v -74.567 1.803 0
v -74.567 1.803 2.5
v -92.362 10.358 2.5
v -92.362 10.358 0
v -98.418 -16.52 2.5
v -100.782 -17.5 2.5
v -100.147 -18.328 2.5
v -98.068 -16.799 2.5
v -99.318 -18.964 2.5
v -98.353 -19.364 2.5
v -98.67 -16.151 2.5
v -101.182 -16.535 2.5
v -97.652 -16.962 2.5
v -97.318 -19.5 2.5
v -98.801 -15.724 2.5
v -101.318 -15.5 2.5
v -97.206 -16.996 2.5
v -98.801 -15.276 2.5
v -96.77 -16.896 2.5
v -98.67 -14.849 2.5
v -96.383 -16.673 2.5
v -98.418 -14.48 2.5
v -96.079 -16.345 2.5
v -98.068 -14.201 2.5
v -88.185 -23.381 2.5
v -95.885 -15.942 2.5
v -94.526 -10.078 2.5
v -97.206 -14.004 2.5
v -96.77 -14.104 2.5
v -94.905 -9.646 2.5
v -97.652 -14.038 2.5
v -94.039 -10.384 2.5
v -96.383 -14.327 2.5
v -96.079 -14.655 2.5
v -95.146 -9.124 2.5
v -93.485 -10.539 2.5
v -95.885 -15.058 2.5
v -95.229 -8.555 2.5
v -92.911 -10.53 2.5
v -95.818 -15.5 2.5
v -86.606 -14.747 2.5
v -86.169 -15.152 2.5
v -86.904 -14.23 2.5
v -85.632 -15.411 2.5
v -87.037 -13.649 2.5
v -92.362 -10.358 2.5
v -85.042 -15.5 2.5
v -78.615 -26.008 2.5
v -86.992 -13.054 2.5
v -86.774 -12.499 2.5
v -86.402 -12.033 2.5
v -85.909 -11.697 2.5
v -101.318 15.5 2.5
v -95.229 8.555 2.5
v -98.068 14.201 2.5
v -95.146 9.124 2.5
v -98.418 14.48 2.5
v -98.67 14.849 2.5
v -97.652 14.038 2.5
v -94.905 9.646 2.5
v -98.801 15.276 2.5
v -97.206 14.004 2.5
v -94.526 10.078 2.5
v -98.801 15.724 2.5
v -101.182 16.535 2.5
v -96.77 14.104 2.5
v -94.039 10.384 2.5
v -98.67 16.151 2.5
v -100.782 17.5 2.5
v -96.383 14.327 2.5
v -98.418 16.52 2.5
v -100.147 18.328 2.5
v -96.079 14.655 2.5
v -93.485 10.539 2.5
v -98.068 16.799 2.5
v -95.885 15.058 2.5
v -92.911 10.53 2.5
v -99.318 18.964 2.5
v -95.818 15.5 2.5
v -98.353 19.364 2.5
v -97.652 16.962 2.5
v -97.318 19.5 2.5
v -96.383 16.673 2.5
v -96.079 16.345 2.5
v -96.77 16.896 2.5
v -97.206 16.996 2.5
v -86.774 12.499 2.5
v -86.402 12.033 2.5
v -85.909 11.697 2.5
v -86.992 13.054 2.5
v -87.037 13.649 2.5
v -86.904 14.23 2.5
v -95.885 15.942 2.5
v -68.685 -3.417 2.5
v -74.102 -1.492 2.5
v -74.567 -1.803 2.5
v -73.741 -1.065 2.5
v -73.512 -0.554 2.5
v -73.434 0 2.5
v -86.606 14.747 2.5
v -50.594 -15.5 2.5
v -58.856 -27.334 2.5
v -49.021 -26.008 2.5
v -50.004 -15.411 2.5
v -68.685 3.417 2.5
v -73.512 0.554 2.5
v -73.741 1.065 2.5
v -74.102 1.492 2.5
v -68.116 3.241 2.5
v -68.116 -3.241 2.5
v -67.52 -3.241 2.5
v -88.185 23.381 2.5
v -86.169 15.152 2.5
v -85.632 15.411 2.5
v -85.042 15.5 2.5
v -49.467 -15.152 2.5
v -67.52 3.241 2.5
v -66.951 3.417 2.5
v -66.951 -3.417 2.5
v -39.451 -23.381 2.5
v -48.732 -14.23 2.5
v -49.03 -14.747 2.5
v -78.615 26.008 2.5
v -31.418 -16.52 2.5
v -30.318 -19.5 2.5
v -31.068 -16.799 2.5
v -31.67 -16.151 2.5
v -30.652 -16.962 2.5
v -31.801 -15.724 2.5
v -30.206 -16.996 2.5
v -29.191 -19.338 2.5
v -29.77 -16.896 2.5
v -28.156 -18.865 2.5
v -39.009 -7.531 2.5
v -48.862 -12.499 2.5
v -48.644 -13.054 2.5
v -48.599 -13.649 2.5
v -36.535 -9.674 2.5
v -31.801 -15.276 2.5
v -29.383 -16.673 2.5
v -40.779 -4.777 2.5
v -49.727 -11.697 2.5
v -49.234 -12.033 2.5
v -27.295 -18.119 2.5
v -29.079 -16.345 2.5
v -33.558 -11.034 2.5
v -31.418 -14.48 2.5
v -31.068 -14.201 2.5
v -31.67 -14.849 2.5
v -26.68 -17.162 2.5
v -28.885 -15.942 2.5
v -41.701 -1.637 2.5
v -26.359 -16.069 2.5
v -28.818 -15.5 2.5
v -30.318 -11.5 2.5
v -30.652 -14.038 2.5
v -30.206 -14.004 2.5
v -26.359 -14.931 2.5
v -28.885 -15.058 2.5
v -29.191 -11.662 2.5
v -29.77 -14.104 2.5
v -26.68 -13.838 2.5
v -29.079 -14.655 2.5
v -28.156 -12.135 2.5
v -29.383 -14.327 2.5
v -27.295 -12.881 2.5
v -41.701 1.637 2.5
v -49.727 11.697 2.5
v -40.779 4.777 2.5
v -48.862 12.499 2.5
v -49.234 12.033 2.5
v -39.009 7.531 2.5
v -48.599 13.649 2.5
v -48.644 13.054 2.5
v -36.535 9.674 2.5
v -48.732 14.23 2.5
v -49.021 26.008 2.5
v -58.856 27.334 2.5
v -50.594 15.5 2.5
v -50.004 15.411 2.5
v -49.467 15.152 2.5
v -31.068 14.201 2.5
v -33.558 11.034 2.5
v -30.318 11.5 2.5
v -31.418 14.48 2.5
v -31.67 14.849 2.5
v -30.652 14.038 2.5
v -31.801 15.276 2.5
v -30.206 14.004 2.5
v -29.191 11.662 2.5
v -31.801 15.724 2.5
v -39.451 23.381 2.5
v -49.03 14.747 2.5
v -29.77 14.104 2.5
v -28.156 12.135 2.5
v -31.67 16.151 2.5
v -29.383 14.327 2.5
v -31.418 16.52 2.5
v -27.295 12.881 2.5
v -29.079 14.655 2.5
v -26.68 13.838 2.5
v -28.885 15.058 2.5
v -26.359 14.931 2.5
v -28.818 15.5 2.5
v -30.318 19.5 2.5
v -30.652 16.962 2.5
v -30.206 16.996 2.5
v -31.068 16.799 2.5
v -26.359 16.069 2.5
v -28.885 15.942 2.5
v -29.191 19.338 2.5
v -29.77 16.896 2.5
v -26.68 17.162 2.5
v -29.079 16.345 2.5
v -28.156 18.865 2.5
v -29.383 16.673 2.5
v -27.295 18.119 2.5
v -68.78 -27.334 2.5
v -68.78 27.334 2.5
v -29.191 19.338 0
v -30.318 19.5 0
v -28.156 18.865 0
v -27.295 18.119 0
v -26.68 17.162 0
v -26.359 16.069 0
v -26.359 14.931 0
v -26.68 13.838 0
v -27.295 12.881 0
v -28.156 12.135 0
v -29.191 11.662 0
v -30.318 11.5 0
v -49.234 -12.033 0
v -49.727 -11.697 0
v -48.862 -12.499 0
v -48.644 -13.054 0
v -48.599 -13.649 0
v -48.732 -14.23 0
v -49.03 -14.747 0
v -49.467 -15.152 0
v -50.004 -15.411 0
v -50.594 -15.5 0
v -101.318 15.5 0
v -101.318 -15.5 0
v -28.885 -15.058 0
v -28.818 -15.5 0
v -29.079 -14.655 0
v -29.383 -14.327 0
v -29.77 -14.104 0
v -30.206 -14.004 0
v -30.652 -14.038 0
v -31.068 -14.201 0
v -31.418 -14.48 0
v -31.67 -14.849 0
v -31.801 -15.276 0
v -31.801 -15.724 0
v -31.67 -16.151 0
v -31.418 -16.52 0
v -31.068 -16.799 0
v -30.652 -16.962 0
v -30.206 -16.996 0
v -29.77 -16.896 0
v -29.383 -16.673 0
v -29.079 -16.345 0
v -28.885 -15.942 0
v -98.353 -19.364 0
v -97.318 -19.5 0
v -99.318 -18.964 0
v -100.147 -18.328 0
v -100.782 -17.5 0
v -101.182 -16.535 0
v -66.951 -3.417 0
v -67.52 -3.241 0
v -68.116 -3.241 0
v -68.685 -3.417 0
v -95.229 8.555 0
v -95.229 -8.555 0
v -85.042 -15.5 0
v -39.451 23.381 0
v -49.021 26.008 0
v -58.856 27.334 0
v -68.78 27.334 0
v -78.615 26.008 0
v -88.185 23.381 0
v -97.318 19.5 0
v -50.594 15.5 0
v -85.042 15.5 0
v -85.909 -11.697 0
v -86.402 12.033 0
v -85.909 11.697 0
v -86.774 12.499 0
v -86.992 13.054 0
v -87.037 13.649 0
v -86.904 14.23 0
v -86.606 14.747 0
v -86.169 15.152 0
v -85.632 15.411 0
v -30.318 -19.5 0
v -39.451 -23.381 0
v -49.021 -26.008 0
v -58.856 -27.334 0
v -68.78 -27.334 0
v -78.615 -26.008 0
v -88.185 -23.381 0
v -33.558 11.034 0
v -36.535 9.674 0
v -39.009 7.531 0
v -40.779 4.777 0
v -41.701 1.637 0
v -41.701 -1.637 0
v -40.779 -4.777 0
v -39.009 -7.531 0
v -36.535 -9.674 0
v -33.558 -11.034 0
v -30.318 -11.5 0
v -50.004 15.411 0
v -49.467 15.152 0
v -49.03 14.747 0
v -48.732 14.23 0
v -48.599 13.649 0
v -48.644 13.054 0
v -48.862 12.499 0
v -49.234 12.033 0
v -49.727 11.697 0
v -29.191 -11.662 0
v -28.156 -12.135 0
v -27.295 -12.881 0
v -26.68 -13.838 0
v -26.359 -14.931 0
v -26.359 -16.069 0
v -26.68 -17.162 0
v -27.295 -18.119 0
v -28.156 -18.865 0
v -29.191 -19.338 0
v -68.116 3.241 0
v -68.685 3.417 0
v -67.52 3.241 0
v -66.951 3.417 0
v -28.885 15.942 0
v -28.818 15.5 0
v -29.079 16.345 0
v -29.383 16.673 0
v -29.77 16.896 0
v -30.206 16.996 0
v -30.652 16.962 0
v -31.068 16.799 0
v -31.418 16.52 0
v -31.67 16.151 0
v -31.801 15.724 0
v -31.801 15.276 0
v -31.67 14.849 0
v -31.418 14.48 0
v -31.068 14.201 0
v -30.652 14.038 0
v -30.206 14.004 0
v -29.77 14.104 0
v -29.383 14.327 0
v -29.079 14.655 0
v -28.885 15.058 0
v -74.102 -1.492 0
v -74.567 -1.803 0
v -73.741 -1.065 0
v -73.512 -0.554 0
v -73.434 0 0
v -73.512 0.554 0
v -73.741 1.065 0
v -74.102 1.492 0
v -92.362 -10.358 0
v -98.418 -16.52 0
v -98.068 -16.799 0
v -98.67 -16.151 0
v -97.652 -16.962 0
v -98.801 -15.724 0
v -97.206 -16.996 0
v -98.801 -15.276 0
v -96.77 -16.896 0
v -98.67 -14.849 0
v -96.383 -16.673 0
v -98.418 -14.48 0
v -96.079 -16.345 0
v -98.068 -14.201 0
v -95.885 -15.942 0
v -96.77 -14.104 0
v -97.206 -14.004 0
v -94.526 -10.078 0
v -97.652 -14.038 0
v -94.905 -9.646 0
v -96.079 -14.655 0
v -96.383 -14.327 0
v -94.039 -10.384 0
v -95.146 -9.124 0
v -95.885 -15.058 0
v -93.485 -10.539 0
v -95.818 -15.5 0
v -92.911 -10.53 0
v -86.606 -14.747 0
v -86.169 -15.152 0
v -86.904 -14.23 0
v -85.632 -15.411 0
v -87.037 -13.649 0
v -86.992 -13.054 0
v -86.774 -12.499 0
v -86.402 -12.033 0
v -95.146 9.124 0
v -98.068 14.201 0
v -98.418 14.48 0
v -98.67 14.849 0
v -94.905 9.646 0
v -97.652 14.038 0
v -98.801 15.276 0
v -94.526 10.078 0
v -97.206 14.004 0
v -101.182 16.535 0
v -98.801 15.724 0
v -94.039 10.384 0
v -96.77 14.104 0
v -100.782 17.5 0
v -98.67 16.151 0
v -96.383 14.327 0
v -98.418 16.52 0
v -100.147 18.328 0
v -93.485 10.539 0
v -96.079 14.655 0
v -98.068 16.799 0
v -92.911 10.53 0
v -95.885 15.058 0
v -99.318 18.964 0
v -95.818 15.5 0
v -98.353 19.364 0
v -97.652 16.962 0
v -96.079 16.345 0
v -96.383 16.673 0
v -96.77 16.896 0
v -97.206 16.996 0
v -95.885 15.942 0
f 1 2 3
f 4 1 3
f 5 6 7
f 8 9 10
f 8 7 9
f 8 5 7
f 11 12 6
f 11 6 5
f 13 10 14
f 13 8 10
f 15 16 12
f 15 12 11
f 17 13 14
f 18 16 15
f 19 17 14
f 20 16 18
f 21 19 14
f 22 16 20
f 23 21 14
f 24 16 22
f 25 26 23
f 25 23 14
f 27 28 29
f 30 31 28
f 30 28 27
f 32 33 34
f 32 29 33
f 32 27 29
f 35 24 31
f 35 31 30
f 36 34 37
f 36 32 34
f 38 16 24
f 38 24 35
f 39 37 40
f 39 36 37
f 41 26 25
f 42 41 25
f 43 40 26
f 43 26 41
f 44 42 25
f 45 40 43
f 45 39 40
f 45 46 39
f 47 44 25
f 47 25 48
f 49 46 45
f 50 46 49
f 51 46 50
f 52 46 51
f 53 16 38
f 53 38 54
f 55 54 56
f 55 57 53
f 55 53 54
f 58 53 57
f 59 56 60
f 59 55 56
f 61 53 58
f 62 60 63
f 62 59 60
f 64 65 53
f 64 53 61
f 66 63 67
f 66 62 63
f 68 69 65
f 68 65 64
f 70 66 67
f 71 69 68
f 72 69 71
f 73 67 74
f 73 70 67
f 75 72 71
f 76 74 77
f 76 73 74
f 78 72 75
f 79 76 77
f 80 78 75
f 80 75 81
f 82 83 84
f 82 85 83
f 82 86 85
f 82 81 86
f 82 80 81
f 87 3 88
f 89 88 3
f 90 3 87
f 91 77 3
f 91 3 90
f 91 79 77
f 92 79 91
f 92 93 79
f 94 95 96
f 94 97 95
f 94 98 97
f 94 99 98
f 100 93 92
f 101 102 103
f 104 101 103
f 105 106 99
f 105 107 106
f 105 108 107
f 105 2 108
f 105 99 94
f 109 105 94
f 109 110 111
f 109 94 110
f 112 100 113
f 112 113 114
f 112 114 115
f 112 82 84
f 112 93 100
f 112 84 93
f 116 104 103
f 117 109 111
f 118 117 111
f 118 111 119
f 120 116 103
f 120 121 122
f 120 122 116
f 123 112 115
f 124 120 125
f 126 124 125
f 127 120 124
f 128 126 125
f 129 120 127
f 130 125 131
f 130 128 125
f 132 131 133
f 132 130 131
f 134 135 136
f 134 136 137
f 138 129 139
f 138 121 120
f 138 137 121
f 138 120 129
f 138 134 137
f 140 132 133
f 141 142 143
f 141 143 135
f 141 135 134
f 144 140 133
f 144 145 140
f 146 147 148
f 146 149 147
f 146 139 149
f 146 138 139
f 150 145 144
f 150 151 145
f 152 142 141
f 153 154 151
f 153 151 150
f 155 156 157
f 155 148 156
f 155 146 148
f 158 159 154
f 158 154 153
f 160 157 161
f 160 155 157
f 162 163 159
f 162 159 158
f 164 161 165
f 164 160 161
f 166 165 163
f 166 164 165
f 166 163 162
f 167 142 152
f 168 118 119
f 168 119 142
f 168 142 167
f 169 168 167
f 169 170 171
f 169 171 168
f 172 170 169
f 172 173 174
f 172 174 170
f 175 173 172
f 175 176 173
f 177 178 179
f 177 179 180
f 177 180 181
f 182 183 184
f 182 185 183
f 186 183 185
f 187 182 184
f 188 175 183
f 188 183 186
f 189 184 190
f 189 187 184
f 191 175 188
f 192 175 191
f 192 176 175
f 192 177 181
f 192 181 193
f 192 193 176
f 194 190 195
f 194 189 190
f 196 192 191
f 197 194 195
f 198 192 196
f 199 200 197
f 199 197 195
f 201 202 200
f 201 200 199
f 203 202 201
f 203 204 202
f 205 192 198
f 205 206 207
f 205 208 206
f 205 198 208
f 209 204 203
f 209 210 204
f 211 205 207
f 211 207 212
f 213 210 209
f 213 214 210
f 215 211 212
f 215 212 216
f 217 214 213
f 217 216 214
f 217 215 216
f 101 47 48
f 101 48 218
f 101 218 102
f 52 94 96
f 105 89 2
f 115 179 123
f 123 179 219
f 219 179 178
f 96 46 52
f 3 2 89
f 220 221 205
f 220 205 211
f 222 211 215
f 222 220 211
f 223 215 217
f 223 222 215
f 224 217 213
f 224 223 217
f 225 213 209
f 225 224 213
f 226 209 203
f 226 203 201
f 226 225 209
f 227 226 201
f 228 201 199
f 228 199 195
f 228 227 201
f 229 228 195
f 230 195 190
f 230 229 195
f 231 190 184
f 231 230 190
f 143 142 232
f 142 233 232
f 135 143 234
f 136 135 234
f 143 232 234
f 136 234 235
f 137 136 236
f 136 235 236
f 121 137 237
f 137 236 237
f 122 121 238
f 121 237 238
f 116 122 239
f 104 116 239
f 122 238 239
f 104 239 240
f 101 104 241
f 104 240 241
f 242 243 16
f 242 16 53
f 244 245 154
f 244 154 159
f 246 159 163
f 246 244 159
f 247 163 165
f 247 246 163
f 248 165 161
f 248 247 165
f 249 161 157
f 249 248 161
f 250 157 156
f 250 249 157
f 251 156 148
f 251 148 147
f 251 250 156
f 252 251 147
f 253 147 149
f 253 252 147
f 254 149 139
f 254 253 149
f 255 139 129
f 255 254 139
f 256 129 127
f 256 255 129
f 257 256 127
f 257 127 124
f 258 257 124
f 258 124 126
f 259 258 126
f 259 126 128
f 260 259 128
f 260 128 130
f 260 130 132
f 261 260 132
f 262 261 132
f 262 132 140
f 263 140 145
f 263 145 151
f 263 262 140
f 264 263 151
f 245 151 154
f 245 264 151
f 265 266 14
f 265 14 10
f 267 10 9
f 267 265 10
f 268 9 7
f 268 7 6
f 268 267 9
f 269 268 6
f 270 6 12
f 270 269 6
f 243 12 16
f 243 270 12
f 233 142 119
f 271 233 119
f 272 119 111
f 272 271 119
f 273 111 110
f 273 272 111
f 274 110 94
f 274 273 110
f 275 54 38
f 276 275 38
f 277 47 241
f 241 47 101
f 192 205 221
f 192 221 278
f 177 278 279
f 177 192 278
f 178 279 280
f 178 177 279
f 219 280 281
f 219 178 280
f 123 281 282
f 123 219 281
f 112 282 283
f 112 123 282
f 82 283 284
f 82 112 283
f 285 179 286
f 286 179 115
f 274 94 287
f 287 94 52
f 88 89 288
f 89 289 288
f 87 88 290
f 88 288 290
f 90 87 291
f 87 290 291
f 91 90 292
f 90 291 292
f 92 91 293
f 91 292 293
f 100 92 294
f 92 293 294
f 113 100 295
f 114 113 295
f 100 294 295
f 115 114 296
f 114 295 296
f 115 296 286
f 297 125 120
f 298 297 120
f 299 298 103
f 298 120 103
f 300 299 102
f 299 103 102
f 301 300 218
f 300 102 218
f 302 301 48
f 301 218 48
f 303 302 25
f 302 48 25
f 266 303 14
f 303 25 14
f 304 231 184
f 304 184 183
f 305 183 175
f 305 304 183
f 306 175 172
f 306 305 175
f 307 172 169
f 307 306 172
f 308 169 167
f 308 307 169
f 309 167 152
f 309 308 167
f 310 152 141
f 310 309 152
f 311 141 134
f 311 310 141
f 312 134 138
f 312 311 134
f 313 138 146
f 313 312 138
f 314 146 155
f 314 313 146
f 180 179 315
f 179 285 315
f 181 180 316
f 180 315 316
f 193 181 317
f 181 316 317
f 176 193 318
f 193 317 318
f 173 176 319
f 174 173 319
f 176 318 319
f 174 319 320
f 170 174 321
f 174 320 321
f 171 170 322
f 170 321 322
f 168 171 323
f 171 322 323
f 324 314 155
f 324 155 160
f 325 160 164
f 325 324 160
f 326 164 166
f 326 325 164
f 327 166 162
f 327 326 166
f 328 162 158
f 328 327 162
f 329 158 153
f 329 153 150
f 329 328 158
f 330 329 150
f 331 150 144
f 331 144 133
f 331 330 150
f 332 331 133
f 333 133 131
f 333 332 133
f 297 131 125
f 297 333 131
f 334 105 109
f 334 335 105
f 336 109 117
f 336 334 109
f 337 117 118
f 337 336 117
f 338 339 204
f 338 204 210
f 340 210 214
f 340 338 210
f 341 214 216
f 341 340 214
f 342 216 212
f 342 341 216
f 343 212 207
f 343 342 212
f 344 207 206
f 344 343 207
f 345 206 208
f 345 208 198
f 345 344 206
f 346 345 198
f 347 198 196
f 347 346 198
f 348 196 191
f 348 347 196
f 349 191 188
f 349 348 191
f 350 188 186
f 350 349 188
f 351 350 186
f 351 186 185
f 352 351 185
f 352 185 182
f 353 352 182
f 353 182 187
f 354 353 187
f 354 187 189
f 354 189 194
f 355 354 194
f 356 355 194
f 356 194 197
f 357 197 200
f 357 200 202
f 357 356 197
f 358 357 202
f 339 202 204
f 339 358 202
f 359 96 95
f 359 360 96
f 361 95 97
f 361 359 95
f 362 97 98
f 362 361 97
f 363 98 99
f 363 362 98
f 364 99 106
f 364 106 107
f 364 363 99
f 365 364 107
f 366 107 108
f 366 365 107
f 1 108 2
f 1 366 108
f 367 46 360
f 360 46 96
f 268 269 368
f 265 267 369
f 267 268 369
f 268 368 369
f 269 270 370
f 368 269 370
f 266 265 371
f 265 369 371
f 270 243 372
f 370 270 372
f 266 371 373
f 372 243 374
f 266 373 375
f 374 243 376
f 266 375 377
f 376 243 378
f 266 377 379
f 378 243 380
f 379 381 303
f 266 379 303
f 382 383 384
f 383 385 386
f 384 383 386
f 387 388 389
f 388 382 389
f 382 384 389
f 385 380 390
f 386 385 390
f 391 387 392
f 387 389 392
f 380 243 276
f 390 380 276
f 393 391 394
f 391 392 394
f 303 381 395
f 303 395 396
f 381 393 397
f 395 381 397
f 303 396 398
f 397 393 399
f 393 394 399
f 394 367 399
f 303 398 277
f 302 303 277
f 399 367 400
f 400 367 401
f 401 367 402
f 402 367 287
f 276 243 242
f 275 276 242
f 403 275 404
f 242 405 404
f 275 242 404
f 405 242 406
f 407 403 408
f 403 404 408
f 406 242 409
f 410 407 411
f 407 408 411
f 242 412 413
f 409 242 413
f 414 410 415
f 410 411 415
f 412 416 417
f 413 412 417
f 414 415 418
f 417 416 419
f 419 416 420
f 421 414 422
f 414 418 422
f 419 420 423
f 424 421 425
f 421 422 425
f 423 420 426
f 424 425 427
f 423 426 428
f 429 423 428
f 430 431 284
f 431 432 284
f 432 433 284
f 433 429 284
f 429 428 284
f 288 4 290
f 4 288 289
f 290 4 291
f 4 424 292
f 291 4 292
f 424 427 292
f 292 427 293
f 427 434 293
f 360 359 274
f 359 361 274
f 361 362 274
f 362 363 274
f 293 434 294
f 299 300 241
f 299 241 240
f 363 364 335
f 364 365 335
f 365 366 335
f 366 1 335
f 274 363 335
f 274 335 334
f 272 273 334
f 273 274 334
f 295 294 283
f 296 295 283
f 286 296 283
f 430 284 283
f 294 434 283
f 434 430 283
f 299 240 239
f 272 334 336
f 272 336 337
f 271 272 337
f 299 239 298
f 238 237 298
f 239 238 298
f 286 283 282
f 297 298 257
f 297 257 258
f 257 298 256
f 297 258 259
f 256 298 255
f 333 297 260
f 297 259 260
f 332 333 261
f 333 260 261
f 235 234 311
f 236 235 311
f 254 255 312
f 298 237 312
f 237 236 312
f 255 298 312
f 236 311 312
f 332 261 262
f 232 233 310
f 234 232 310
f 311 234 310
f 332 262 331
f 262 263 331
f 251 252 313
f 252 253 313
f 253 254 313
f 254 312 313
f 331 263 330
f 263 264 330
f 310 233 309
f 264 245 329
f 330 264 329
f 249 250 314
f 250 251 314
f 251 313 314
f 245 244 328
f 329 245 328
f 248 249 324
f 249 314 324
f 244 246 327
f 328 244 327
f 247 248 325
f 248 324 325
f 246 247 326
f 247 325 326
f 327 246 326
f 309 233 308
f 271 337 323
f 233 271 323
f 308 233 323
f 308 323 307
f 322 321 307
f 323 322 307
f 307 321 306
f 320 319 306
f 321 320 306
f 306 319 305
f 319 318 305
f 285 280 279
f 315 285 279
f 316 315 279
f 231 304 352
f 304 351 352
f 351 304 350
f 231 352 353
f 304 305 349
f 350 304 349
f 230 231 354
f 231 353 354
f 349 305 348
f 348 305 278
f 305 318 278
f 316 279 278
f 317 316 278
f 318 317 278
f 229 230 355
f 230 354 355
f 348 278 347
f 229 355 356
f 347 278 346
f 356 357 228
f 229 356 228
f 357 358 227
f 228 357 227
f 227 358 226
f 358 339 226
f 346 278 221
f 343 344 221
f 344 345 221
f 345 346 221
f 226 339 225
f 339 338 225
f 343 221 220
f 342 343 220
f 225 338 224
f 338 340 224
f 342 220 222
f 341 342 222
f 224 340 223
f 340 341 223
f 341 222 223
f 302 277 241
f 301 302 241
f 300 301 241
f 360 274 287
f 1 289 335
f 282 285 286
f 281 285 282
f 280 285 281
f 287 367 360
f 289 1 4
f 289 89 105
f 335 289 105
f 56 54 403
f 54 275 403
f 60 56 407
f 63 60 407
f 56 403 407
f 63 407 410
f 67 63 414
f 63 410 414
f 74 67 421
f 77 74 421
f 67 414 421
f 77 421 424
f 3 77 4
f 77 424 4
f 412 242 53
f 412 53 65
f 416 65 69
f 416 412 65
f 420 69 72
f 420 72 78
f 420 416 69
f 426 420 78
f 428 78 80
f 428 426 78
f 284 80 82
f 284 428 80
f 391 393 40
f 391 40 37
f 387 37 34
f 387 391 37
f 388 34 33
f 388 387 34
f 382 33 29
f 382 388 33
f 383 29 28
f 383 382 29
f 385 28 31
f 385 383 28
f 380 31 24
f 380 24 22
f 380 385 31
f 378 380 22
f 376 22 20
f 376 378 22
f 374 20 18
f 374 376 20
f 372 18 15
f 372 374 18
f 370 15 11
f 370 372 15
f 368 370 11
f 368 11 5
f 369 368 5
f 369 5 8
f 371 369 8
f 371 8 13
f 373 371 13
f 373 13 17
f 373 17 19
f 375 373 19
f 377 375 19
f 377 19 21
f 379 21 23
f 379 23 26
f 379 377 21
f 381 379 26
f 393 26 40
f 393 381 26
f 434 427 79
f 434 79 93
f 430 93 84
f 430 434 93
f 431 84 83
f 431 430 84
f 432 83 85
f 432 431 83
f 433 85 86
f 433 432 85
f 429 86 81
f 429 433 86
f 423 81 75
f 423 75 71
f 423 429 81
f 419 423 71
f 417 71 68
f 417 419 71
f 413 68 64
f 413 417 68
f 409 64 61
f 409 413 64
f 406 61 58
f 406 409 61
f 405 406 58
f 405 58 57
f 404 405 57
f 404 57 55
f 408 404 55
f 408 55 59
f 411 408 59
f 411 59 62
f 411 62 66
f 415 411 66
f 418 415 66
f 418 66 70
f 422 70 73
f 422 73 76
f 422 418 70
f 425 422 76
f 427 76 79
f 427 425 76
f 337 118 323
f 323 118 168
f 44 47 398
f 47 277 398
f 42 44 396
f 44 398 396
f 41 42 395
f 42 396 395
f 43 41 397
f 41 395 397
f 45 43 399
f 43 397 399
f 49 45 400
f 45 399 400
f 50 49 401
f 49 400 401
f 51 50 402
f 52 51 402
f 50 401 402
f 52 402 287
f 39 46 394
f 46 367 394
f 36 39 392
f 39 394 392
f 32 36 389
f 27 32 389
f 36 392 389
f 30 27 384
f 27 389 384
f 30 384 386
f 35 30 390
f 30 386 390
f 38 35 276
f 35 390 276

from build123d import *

# Parameters (mm, degrees)
CROQUIS2_R              = 1.5
SALIENTE_EXTRUIR1_DEPTH = 2.5
CORTAR_EXTRUIR1_DEPTH   = 2.5
REDONDEO1_R             = 2
SALIENTE_EXTRUIR2_DEPTH = 2.5


with BuildPart() as part:
    # Croquis2 → Saliente-Extruir1 (new body)
    with BuildSketch(Plane.XY):
        with BuildLine():
            Line((-97.318076, 19.5), (-30.318076, 19.5))
            ThreePointArc((-30.318076, 19.5), (-26.318076, 15.5), (-30.318076, 11.5))
            ThreePointArc((-30.318076, 11.5), (-41.818076, 0), (-30.318076, -11.5))
            ThreePointArc((-30.318076, -11.5), (-26.318076, -15.5), (-30.318076, -19.5))
            Line((-30.318076, -19.5), (-97.318076, -19.5))
            ThreePointArc((-97.318076, -19.5), (-100.146503125, -18.328427125), (-101.318076, -15.5))
            Line((-101.318076, -15.5), (-101.318076, 15.5))
            ThreePointArc((-101.318076, 15.5), (-100.146503125, 18.328427125), (-97.318076, 19.5))
        make_face()
        with Locations((-97.318076, 15.5)):
            Circle(CROQUIS2_R, mode=Mode.SUBTRACT)
        with Locations((-30.318076, 15.5)):
            Circle(CROQUIS2_R, mode=Mode.SUBTRACT)
        with Locations((-30.318076, -15.5)):
            Circle(CROQUIS2_R, mode=Mode.SUBTRACT)
        with Locations((-97.318076, -15.5)):
            Circle(CROQUIS2_R, mode=Mode.SUBTRACT)
    extrude(amount=SALIENTE_EXTRUIR1_DEPTH)

    # Croquis3 → Cortar-Extruir1 (cut)
    with BuildSketch(Plane.XY.offset(2.5)):
        Polygon((-67.818076, 3), (-41.818076, 15.5), (-93.818076, 15.5), align=None)
        Polygon((-67.818076, -3), (-93.818076, -15.5), (-41.818076, -15.5), align=None)
        Polygon((-70.818076, 0), (-95.228698469, 11.735876187), (-95.228698469, -11.735876187), align=None)
    extrude(amount=-CORTAR_EXTRUIR1_DEPTH, mode=Mode.SUBTRACT)

    # Redondeo1
    redondeo1_edges = [part.edges().sort_by_distance(p)[0] for p in [
        (-67.818076, -3, 1.25),
        (-41.818076, -15.5, 1.25),
        (-93.818076, -15.5, 1.25),
        (-70.818076, 0, 1.25),
        (-95.228698469, -11.735876187, 1.25),
        (-95.228698469, 11.735876187, 1.25),
        (-67.818076, 3, 1.25),
        (-93.818076, 15.5, 1.25),
        (-41.818076, 15.5, 1.25),
    ]]
    fillet(redondeo1_edges, radius=REDONDEO1_R)

    # Croquis5 → Saliente-Extruir2 (add)
    with BuildSketch(Plane.XY.offset(2.5)):
        with BuildLine():
            Line((-97.318076, 19.5), (-30.318076, 19.5))
            ThreePointArc((-30.318076, 19.5), (-63.818076, 27.5), (-97.318076, 19.5))
        make_face()
        with BuildLine():
            Line((-97.318076, -19.5), (-30.318076, -19.5))
            ThreePointArc((-30.318076, -19.5), (-63.818076, -27.5), (-97.318076, -19.5))
        make_face()
    extrude(amount=-SALIENTE_EXTRUIR2_DEPTH)


solid = part.part
